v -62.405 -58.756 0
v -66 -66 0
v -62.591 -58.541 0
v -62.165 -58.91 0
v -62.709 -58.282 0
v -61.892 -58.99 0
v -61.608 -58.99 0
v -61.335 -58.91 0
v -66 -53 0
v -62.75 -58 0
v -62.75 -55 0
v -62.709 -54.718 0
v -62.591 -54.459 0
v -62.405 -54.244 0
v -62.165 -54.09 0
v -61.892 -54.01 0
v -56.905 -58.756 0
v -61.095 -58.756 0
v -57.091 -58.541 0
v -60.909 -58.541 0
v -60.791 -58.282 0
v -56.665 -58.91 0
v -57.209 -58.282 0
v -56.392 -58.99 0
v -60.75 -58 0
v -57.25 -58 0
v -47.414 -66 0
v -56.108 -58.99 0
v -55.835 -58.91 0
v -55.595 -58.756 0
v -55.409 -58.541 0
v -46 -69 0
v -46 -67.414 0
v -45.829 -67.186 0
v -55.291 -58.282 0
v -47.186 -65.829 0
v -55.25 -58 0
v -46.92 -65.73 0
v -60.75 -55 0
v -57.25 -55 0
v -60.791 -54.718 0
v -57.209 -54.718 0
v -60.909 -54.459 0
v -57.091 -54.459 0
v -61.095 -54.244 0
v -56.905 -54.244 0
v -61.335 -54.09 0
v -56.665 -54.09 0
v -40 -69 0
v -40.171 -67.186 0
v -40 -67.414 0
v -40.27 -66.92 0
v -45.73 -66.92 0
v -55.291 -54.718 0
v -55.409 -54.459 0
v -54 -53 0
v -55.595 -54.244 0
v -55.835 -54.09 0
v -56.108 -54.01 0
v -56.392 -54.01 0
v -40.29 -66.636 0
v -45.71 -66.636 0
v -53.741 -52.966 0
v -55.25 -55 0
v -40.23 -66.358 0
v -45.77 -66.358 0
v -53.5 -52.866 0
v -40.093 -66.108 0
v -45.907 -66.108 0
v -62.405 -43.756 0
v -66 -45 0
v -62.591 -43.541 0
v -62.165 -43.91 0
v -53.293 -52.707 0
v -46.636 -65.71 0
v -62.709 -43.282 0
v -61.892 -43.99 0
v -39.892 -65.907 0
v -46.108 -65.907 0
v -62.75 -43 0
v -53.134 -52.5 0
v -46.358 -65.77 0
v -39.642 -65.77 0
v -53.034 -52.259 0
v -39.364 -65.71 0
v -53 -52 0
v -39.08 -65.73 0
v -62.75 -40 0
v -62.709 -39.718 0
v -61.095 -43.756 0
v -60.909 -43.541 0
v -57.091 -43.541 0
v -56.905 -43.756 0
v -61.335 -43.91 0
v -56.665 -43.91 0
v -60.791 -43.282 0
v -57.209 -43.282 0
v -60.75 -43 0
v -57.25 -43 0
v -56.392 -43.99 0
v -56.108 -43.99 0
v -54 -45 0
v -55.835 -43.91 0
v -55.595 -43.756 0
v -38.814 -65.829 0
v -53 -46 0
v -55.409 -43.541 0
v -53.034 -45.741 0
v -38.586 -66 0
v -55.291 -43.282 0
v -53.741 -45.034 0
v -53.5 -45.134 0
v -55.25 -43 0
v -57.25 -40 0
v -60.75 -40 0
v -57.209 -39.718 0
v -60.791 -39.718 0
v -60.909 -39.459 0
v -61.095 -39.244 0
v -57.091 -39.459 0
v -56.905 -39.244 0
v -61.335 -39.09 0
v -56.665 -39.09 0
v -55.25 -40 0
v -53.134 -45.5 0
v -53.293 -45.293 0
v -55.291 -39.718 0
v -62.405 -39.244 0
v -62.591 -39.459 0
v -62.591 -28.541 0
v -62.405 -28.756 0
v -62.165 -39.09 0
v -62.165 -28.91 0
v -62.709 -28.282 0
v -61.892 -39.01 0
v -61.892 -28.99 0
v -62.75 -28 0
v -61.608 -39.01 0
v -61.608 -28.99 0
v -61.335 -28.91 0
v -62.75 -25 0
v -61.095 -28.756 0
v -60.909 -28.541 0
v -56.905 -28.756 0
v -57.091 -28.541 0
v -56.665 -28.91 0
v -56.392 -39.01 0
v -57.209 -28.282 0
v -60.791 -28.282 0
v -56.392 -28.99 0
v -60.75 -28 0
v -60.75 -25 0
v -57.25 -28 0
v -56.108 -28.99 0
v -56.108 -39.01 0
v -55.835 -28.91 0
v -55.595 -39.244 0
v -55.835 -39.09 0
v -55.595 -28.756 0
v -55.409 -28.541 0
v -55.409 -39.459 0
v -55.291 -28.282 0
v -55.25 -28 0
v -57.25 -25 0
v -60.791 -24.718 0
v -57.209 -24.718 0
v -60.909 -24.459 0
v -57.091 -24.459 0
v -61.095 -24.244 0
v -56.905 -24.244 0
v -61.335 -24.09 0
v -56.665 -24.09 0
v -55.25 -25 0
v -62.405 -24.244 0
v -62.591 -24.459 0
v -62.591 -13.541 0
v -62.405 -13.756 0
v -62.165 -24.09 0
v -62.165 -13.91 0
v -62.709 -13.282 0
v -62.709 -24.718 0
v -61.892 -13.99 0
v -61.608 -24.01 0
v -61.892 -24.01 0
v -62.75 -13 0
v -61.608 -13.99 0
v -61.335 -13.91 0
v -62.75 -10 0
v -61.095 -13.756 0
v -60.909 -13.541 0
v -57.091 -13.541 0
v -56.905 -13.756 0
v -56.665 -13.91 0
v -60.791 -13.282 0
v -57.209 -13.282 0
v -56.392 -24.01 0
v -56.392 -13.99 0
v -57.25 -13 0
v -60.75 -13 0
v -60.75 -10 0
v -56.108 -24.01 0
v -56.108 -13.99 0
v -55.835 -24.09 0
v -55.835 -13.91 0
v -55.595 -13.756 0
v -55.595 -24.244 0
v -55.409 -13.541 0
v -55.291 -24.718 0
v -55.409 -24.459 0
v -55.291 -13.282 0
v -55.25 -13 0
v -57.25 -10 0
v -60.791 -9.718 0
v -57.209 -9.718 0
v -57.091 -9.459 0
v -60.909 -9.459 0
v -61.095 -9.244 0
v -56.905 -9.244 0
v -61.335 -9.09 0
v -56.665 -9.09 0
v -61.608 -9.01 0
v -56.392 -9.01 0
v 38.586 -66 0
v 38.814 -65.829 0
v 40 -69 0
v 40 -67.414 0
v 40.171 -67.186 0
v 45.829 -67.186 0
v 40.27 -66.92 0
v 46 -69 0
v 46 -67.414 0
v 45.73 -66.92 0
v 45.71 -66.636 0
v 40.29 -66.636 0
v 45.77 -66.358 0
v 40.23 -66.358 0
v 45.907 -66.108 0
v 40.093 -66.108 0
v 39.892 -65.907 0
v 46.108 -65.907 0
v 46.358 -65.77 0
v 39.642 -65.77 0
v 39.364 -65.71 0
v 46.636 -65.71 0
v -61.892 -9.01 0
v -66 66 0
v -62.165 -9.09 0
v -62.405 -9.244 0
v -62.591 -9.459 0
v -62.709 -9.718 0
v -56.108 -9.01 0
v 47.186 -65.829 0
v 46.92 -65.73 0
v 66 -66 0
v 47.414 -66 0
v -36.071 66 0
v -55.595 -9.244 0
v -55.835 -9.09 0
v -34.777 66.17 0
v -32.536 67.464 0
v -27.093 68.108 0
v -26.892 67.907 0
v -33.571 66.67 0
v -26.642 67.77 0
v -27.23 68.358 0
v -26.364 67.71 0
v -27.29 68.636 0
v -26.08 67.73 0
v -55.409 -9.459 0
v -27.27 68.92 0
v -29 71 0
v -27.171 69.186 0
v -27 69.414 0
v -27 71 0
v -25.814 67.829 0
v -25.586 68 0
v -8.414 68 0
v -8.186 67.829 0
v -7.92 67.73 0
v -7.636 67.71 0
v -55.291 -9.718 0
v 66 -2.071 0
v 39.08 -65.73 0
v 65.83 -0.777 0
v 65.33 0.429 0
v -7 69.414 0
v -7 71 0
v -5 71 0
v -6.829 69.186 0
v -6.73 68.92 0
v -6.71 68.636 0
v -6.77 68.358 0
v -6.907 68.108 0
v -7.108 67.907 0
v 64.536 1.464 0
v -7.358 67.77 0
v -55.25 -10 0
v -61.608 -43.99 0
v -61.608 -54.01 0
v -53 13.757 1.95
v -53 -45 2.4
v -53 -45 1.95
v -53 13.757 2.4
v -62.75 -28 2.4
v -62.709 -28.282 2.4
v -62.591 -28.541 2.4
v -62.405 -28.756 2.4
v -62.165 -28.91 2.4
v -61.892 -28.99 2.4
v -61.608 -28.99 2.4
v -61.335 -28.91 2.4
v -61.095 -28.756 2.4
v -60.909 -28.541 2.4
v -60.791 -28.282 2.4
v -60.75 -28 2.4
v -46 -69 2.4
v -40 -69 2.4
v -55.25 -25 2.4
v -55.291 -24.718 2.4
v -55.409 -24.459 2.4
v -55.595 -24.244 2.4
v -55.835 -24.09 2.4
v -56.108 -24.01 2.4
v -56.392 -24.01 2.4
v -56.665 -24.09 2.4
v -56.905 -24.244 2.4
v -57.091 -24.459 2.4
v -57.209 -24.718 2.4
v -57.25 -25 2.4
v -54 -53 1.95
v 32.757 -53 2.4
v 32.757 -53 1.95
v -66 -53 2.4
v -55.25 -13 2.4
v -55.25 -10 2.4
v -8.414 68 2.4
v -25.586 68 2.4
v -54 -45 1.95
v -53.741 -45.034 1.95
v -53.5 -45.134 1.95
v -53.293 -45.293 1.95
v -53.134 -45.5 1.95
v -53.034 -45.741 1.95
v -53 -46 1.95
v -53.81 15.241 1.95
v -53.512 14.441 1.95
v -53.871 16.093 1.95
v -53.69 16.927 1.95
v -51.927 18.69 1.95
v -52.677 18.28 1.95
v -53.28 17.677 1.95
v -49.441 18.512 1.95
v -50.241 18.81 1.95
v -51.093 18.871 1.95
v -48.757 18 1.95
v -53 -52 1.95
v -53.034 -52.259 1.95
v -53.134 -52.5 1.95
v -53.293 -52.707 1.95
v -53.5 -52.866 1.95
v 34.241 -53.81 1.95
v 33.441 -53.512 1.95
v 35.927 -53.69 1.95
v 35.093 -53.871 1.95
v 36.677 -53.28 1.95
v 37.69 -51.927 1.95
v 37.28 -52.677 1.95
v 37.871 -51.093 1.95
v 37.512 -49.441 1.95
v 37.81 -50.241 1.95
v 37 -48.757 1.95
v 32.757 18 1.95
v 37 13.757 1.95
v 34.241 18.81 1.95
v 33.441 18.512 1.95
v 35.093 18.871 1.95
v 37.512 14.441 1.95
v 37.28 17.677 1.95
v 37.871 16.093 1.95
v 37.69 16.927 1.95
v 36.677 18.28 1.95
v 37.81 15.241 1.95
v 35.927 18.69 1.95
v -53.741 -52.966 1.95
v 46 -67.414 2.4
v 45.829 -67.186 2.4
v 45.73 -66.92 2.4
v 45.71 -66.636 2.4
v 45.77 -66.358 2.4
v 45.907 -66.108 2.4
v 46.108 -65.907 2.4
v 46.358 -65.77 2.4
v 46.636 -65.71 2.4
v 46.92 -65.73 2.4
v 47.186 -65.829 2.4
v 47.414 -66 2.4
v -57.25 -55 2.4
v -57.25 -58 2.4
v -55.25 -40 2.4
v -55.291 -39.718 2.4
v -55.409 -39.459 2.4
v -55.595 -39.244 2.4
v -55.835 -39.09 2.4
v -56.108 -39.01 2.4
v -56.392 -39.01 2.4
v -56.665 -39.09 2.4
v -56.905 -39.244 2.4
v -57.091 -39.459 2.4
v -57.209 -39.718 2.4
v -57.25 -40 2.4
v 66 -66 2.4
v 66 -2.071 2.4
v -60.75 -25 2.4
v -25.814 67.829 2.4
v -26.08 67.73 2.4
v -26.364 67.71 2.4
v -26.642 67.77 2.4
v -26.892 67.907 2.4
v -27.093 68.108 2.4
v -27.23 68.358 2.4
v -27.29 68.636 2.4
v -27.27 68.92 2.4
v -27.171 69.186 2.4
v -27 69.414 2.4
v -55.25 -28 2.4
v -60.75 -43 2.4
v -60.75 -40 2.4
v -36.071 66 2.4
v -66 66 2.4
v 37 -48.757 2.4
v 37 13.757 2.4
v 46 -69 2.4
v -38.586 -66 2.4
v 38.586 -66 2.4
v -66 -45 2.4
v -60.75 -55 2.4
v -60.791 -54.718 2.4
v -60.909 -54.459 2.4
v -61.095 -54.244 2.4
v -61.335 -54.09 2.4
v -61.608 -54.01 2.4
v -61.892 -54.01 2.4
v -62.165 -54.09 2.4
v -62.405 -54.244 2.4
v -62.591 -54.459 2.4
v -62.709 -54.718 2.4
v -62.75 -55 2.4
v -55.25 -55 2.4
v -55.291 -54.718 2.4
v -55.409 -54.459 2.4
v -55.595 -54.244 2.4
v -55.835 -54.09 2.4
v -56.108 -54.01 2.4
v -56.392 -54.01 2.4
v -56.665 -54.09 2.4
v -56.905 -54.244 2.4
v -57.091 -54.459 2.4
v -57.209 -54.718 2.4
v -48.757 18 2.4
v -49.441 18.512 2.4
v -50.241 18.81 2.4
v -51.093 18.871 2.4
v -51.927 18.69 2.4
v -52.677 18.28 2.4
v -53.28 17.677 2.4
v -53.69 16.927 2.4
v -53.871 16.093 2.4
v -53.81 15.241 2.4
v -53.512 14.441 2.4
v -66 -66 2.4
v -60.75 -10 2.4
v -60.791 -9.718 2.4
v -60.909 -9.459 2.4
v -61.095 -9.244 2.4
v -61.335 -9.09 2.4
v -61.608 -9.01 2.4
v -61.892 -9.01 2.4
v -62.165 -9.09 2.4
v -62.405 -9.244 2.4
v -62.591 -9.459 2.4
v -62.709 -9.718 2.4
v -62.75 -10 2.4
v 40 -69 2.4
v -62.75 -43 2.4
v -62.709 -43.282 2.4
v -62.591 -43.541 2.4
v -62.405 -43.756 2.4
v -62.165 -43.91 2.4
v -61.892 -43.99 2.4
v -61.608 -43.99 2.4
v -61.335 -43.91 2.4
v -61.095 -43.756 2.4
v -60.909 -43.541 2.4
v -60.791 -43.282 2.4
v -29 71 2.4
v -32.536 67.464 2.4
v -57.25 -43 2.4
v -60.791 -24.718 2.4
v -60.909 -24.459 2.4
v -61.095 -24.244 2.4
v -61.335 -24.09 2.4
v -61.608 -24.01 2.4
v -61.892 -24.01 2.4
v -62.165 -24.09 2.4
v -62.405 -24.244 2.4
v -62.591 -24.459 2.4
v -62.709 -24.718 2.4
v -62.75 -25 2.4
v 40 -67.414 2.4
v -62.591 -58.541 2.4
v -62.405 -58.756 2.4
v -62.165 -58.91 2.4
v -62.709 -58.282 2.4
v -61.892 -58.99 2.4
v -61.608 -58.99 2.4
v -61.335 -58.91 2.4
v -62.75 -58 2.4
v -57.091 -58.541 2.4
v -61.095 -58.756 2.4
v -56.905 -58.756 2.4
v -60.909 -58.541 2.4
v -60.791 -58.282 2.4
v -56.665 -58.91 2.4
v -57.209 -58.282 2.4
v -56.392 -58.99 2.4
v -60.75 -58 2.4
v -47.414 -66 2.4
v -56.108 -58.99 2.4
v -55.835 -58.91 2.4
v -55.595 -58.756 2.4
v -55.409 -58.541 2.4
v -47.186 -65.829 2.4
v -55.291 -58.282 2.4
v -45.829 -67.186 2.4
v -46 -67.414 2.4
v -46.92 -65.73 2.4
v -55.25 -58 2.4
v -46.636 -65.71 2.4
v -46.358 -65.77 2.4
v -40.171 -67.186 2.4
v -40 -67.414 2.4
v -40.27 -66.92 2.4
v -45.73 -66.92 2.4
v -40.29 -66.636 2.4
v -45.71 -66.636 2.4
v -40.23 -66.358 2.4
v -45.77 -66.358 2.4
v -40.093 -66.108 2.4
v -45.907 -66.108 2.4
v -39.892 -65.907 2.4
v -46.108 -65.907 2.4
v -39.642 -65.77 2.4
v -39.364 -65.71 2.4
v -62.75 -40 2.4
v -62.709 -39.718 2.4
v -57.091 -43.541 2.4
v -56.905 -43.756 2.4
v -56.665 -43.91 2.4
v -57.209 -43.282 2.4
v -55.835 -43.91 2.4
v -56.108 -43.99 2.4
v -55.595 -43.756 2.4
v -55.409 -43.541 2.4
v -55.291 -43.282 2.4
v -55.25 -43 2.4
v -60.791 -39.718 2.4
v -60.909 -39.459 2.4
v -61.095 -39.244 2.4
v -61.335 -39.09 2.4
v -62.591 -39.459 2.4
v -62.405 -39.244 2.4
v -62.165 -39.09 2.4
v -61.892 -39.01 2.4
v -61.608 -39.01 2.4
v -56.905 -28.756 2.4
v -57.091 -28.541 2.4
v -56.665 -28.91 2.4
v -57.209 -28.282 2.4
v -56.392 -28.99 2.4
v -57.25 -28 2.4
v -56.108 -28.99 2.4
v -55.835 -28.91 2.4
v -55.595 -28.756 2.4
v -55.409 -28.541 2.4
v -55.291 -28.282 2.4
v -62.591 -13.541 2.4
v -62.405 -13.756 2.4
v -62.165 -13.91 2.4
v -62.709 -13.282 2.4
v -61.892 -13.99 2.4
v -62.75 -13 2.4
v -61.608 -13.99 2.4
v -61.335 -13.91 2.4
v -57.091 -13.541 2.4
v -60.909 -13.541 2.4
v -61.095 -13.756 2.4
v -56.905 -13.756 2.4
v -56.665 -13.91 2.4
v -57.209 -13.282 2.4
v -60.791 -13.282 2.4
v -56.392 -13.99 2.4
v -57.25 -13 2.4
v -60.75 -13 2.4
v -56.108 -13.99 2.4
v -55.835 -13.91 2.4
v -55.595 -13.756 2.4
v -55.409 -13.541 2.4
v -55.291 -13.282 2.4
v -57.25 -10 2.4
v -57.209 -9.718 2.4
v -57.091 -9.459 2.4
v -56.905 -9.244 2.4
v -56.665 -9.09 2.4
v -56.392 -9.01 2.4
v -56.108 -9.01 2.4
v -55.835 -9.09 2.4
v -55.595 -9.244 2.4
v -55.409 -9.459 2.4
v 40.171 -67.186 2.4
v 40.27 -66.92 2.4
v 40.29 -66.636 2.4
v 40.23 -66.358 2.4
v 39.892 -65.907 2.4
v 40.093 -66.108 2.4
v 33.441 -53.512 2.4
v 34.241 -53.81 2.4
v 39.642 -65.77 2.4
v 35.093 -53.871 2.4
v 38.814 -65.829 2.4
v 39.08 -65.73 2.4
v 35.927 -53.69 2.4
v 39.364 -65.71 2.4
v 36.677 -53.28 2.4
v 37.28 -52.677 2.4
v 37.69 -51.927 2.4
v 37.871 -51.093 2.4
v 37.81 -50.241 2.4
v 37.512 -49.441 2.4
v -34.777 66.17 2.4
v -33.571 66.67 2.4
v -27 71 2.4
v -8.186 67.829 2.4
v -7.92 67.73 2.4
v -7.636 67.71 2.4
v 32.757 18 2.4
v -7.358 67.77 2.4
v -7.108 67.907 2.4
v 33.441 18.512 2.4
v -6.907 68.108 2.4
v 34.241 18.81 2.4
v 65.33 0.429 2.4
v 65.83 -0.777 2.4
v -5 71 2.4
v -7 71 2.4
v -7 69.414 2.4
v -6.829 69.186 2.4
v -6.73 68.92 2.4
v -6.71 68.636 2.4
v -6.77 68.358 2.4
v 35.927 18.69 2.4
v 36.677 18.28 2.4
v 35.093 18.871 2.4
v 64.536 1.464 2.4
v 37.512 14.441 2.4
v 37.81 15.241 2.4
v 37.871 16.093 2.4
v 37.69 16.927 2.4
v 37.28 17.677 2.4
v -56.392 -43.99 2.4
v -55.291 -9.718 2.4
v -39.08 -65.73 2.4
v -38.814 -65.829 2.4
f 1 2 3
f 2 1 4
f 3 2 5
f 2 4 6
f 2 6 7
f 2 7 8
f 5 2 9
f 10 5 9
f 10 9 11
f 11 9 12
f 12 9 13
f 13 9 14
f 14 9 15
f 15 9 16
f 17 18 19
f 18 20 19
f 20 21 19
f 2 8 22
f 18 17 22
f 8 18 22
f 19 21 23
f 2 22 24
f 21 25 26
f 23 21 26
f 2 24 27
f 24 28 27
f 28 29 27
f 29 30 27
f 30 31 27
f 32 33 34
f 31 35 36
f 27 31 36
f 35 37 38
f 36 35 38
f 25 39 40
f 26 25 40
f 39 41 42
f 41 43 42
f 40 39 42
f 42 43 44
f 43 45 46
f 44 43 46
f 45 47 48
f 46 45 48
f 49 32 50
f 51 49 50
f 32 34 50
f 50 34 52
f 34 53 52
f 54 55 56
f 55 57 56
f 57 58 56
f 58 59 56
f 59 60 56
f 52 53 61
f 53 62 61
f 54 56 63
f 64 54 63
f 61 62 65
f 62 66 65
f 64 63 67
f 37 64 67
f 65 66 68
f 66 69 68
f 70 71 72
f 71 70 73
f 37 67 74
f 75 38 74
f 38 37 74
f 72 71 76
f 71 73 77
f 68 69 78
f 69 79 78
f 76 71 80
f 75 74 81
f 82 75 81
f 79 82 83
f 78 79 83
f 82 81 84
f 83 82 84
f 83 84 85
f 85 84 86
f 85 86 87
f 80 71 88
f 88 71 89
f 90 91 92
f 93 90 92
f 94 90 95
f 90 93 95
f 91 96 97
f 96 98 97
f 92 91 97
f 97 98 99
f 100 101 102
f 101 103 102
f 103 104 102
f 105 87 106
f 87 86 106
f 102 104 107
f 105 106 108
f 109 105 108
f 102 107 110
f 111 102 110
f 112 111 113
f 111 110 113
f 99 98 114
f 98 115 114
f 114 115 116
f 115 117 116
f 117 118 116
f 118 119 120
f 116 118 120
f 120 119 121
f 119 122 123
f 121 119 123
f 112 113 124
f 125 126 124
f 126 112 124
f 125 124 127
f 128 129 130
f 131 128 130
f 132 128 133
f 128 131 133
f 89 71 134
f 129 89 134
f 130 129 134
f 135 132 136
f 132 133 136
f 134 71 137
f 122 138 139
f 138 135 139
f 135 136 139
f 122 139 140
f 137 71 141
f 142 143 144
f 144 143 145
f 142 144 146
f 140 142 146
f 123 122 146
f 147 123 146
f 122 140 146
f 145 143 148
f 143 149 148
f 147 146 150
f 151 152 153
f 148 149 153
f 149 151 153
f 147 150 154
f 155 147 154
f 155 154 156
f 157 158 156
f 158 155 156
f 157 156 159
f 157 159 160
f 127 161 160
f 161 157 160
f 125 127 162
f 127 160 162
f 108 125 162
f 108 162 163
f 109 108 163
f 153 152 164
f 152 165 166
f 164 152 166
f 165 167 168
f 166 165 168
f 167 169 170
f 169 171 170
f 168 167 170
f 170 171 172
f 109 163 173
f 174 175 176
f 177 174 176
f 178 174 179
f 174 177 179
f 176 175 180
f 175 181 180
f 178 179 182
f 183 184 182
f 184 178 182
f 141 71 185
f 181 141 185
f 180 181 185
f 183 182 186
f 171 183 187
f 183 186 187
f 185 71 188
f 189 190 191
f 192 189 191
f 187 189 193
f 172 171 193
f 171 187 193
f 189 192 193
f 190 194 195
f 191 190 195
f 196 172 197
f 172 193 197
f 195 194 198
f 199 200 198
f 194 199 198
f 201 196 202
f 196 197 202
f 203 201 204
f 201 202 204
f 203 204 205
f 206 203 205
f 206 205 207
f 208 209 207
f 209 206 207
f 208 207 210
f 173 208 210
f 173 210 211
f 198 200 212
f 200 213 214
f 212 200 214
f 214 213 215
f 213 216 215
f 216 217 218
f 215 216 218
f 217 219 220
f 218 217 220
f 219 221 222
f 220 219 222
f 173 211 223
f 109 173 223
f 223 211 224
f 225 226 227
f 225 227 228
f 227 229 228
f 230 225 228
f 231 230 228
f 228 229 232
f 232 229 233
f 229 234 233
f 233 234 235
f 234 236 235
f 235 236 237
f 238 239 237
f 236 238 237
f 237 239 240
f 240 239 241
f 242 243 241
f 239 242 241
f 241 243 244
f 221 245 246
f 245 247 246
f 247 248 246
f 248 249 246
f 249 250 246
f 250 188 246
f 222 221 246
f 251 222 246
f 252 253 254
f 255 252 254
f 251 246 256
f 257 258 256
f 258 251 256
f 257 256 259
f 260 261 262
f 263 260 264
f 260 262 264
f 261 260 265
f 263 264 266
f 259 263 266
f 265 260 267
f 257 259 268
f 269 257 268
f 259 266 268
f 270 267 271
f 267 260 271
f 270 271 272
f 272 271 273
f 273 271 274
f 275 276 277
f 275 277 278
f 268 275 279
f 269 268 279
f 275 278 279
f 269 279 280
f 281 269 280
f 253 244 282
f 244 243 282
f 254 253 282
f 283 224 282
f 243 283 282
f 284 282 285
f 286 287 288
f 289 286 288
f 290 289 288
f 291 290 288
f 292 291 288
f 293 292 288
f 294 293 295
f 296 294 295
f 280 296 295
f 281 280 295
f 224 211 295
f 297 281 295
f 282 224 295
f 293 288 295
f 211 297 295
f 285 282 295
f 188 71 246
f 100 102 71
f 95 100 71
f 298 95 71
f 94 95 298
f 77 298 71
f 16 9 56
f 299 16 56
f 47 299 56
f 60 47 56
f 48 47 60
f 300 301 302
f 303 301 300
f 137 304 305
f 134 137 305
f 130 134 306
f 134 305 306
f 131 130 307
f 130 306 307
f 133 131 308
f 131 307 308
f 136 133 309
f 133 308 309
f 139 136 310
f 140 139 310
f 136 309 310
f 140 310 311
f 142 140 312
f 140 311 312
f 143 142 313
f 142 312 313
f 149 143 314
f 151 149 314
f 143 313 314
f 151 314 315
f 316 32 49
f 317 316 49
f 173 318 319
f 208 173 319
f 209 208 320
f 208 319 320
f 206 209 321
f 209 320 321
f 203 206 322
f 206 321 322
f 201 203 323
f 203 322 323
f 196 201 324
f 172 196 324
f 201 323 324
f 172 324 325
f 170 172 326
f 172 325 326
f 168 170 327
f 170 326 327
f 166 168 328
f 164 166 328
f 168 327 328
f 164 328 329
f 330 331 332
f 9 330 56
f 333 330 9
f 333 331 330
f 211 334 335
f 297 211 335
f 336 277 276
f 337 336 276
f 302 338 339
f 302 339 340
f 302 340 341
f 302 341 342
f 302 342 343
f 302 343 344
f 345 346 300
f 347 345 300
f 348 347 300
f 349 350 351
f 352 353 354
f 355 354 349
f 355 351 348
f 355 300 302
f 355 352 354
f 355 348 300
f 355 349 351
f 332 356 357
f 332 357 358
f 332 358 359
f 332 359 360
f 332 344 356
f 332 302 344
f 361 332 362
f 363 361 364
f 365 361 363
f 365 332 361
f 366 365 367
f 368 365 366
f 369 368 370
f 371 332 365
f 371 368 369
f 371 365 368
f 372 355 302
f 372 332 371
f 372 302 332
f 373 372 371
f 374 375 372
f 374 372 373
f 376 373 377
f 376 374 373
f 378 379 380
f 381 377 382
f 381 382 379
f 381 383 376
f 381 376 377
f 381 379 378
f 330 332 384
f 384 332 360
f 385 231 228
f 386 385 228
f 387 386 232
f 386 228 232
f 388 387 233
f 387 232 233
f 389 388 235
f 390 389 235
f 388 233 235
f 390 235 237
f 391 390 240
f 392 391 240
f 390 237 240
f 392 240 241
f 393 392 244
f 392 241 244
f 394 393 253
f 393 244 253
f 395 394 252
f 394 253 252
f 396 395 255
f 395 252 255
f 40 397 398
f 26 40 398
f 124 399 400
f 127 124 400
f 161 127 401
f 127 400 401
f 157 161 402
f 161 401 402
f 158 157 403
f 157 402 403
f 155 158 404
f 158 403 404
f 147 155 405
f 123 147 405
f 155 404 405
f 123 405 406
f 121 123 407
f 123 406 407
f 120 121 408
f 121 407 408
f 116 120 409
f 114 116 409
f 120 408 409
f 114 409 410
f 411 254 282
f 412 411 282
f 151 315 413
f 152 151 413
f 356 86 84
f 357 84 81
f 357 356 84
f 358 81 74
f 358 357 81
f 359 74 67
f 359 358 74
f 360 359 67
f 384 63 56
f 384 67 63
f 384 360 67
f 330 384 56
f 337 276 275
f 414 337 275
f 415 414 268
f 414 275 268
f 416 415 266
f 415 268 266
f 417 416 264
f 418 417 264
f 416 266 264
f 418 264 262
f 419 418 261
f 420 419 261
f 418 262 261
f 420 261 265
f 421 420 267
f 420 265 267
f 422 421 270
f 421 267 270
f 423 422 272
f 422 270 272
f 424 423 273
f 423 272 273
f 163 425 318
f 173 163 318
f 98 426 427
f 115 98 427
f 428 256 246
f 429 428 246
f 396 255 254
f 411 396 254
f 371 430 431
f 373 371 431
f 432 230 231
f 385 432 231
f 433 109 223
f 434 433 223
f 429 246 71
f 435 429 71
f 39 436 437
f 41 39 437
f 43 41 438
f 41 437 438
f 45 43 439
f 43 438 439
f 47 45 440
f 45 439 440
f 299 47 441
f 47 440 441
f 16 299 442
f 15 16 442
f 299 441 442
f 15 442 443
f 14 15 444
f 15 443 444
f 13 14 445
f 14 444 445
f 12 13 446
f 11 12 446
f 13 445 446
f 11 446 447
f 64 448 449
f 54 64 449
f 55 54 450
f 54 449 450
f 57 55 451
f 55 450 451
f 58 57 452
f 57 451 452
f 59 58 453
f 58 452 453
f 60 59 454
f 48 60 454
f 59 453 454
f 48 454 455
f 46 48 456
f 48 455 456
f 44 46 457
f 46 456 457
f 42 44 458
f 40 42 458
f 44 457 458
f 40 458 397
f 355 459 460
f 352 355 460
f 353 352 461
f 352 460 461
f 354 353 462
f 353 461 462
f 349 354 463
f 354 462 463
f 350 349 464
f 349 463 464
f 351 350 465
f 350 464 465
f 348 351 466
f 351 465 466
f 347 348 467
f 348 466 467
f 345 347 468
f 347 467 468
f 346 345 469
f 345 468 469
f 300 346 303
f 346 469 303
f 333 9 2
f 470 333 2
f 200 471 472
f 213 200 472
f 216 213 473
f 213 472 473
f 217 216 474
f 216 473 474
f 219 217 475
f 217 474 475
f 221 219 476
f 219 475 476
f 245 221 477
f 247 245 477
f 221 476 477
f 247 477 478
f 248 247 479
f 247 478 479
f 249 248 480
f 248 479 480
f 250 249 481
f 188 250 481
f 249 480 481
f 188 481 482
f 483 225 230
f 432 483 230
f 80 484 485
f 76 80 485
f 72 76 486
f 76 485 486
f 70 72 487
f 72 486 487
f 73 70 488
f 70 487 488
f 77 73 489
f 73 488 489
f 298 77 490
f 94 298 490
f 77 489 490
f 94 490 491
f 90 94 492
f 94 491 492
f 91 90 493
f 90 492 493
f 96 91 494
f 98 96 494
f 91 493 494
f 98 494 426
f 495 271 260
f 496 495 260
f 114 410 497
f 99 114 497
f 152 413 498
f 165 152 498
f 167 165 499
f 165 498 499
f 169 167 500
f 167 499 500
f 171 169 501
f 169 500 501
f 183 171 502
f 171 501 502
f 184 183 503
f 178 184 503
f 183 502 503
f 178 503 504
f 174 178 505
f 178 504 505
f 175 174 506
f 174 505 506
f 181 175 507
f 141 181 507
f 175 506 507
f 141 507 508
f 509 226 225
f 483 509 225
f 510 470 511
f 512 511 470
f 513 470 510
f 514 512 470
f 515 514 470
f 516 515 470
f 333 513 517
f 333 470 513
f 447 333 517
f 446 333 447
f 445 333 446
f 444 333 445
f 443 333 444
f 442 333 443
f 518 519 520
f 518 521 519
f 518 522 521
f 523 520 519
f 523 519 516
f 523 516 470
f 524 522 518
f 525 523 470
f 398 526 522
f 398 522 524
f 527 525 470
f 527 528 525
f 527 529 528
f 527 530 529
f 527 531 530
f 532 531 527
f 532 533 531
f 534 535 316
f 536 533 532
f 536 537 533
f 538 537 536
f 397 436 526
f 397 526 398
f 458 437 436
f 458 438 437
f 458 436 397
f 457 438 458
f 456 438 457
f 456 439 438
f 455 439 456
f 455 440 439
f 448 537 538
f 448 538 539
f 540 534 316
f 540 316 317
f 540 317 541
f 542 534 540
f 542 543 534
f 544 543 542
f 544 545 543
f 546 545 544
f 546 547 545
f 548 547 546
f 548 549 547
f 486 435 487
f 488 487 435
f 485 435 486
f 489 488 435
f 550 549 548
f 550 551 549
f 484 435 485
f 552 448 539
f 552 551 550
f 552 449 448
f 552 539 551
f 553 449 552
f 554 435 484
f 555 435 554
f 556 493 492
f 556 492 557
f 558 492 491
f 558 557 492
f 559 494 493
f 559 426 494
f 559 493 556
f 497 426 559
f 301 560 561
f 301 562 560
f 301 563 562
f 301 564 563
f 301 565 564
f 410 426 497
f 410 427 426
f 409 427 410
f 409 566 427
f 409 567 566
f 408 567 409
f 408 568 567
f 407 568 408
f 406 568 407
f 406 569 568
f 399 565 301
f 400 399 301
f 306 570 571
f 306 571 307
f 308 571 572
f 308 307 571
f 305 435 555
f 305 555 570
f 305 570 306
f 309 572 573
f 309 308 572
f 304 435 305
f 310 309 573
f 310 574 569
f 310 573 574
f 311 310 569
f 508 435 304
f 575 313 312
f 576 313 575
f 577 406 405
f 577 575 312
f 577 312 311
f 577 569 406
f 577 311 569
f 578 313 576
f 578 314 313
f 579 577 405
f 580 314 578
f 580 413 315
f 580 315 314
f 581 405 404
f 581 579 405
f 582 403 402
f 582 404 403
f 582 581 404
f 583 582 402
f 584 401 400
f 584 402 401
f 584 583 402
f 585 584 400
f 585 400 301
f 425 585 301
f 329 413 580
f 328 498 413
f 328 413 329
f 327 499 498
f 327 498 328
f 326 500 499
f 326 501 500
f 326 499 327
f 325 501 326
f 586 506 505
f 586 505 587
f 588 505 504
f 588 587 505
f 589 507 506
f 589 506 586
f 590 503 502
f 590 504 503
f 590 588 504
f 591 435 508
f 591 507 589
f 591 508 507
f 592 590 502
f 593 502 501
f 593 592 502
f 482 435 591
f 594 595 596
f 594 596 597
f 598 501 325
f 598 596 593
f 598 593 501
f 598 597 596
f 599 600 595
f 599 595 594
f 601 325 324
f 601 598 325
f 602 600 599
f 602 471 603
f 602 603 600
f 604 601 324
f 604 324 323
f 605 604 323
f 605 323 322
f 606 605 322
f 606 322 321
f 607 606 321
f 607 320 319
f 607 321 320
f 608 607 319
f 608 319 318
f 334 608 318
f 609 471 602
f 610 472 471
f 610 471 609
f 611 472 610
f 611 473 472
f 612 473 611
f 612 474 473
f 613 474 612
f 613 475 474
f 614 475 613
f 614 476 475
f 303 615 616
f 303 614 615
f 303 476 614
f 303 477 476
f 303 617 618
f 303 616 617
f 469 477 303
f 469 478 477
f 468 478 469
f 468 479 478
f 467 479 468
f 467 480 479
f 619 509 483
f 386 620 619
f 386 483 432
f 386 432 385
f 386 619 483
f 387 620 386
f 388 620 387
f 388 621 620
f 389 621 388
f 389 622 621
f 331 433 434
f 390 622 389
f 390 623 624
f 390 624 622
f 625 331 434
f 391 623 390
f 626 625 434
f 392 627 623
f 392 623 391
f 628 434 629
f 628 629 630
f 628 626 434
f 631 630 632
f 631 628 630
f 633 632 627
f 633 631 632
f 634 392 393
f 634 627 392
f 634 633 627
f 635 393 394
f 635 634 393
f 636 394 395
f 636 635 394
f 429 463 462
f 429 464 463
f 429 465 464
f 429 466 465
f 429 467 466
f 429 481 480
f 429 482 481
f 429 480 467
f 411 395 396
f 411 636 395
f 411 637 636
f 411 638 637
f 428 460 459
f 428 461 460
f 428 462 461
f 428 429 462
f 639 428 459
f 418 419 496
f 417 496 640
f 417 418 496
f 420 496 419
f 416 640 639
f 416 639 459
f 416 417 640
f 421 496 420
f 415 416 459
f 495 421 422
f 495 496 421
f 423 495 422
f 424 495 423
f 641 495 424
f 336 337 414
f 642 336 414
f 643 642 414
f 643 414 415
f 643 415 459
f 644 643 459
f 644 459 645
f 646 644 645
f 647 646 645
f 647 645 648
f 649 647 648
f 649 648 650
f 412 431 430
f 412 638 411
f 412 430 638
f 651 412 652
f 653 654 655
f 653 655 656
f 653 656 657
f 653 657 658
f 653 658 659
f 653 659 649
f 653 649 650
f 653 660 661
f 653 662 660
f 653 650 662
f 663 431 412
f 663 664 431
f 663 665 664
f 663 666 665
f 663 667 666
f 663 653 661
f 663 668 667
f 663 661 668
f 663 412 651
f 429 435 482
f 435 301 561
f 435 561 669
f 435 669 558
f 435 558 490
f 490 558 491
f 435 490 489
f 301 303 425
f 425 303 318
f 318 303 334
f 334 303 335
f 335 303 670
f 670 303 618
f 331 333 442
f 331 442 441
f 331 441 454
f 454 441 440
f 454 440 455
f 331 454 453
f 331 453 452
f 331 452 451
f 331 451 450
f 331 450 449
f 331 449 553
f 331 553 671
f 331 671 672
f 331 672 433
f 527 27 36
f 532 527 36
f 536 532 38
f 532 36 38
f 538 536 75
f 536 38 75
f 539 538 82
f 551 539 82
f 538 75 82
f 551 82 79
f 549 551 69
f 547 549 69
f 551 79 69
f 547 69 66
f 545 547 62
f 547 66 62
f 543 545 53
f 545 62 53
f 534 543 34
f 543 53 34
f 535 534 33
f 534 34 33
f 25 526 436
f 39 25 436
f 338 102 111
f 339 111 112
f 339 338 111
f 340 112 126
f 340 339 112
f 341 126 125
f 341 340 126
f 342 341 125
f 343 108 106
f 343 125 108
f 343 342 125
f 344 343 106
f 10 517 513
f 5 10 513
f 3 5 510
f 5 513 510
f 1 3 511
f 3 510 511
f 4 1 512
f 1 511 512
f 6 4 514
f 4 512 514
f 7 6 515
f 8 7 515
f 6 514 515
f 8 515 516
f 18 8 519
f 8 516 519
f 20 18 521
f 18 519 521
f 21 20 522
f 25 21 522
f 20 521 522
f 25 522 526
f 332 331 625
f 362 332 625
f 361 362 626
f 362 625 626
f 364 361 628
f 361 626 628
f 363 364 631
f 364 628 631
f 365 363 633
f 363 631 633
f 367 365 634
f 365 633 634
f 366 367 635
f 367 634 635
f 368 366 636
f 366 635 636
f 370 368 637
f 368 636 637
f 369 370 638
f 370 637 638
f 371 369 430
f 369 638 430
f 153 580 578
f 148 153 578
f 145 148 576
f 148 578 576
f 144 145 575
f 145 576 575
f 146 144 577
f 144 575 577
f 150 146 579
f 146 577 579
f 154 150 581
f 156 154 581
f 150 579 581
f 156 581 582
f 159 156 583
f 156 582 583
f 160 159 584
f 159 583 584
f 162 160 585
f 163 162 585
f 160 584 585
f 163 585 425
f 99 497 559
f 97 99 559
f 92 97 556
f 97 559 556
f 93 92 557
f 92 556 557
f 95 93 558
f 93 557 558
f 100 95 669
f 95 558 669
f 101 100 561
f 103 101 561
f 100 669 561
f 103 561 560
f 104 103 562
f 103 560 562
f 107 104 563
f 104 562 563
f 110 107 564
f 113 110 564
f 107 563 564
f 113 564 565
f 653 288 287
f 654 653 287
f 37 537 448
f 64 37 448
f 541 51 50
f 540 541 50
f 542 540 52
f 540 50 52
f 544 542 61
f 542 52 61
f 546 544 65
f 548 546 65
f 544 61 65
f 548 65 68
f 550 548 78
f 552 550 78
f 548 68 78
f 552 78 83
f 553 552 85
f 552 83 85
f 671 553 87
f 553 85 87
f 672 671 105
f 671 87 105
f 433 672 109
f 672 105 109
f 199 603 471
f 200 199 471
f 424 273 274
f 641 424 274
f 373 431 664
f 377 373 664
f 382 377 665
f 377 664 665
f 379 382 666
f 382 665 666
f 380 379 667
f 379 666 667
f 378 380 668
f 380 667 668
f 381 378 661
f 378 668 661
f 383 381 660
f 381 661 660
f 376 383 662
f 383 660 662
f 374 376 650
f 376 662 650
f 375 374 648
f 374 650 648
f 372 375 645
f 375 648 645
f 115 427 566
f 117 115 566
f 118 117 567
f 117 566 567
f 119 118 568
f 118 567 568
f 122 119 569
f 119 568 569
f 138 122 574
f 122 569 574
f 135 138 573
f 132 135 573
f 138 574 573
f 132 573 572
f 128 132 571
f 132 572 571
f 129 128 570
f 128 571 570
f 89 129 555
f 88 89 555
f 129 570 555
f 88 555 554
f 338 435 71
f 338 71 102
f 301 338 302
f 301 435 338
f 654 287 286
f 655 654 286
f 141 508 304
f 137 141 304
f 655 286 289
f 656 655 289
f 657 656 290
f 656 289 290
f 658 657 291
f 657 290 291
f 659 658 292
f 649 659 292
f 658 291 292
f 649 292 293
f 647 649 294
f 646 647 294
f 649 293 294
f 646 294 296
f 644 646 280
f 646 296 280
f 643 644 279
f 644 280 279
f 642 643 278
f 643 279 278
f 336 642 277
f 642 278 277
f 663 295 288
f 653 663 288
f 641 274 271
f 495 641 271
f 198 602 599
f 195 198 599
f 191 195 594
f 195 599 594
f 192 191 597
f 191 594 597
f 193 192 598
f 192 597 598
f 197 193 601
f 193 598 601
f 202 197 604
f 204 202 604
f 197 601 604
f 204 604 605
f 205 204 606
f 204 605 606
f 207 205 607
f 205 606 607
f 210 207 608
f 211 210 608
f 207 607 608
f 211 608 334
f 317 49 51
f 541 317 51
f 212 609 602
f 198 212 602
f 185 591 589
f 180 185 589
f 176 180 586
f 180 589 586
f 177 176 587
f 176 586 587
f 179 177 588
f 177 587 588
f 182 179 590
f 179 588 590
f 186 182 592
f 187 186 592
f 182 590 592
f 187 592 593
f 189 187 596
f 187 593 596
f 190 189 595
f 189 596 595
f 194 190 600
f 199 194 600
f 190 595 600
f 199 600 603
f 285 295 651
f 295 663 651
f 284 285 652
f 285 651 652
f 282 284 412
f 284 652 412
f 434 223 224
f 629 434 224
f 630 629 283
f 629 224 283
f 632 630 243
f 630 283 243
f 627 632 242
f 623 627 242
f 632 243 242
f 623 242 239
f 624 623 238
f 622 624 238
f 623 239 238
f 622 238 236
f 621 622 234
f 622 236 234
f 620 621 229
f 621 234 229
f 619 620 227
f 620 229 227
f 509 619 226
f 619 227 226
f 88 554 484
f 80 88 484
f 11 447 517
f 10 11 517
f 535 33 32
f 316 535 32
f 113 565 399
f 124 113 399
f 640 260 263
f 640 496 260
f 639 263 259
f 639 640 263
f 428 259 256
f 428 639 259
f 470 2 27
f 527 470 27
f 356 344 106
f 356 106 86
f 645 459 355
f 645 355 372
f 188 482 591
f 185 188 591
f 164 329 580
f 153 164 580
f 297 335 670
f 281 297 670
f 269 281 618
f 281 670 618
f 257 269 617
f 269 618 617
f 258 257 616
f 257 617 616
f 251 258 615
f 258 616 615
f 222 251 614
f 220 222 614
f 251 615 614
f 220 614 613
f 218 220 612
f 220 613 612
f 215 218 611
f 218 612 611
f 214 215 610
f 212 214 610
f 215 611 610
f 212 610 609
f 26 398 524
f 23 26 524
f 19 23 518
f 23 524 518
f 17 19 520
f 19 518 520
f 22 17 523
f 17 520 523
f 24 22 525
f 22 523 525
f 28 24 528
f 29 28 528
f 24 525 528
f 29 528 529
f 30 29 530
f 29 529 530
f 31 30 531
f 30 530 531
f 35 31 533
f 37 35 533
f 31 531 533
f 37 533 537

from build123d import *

# Parameters (mm, degrees)
BOSS_EXTRUDE1_DEPTH = 2.4
CUT_EXTRUDE1_REACH  = 98.968
CUT_EXTRUDE2_DEPTH  = 0.45
CUT_EXTRUDE3_REACH  = 98.958
FILLET1_R           = 5


with BuildPart() as part:
    # Sketch1 → Boss-Extrude1 (new body)
    with BuildSketch(Plane.XY):
        with BuildLine():
            Line((66, 0), (-5, 71))
            Line((-5, 71), (-7, 71))
            Line((-7, 71), (-7, 69.414213562))
            ThreePointArc((-7, 69.414213562), (-7, 68), (-8.414213562, 68))
            Line((-8.414213562, 68), (-25.585786438, 68))
            ThreePointArc((-25.585786438, 68), (-27, 68), (-27, 69.414213562))
            Line((-27, 69.414213562), (-27, 71))
            Line((-27, 71), (-29, 71))
            Line((-29, 71), (-34, 66))
            Line((-34, 66), (-66, 66))
            Line((-66, 66), (-66, -66))
            Line((-66, -66), (-47.414213562, -66))
            ThreePointArc((-47.414213562, -66), (-46, -66), (-46, -67.414213562))
            Line((-46, -67.414213562), (-46, -69))
            Line((-46, -69), (-40, -69))
            Line((-40, -69), (-40, -67.414213562))
            ThreePointArc((-40, -67.414213562), (-40, -66), (-38.585786438, -66))
            Line((-38.585786438, -66), (38.585786438, -66))
            ThreePointArc((38.585786438, -66), (40, -66), (40, -67.414213562))
            Line((40, -67.414213562), (40, -69))
            Line((40, -69), (46, -69))
            Line((46, -69), (46, -67.414213562))
            ThreePointArc((46, -67.414213562), (46, -66), (47.414213562, -66))
            Line((47.414213562, -66), (66, -66))
            Line((66, -66), (66, 0))
        make_face()
    extrude(amount=BOSS_EXTRUDE1_DEPTH)

    # Sketch3 → Cut-Extrude1 (cut, up to next)
    with BuildSketch(Plane.XY.offset(2.4), mode=Mode.PRIVATE) as cut_extrude1_sk1:
        with BuildLine():
            Line((-60.75, -13), (-60.75, -10))
            ThreePointArc((-60.75, -10), (-61.75, -9), (-62.75, -10))
            Line((-62.75, -10), (-62.75, -13))
            ThreePointArc((-62.75, -13), (-61.75, -14), (-60.75, -13))
        make_face()
    cut_extrude1_tool1 = extrude(cut_extrude1_sk1.sketch, amount=-CUT_EXTRUDE1_REACH, mode=Mode.PRIVATE) & part.part
    # Sketch3 → Cut-Extrude1 (cut, up to next)
    with BuildSketch(Plane.XY.offset(2.4), mode=Mode.PRIVATE) as cut_extrude1_sk2:
        with BuildLine():
            ThreePointArc((-55.25, -10), (-56.25, -9), (-57.25, -10))
            Line((-57.25, -10), (-57.25, -13))
            ThreePointArc((-57.25, -13), (-56.25, -14), (-55.25, -13))
            Line((-55.25, -13), (-55.25, -10))
        make_face()
    cut_extrude1_tool2 = extrude(cut_extrude1_sk2.sketch, amount=-CUT_EXTRUDE1_REACH, mode=Mode.PRIVATE) & part.part
    # Sketch3 → Cut-Extrude1 (cut, up to next)
    with BuildSketch(Plane.XY.offset(2.4), mode=Mode.PRIVATE) as cut_extrude1_sk3:
        with BuildLine():
            Line((-60.75, -28), (-60.75, -25))
            ThreePointArc((-60.75, -25), (-61.75, -24), (-62.75, -25))
            Line((-62.75, -25), (-62.75, -28))
            ThreePointArc((-62.75, -28), (-61.75, -29), (-60.75, -28))
        make_face()
    cut_extrude1_tool3 = extrude(cut_extrude1_sk3.sketch, amount=-CUT_EXTRUDE1_REACH, mode=Mode.PRIVATE) & part.part
    # Sketch3 → Cut-Extrude1 (cut, up to next)
    with BuildSketch(Plane.XY.offset(2.4), mode=Mode.PRIVATE) as cut_extrude1_sk4:
        with BuildLine():
            ThreePointArc((-55.25, -25), (-56.25, -24), (-57.25, -25))
            Line((-57.25, -25), (-57.25, -28))
            ThreePointArc((-57.25, -28), (-56.25, -29), (-55.25, -28))
            Line((-55.25, -28), (-55.25, -25))
        make_face()
    cut_extrude1_tool4 = extrude(cut_extrude1_sk4.sketch, amount=-CUT_EXTRUDE1_REACH, mode=Mode.PRIVATE) & part.part
    # Sketch3 → Cut-Extrude1 (cut, up to next)
    with BuildSketch(Plane.XY.offset(2.4), mode=Mode.PRIVATE) as cut_extrude1_sk5:
        with BuildLine():
            Line((-60.75, -43), (-60.75, -40))
            ThreePointArc((-60.75, -40), (-61.75, -39), (-62.75, -40))
            Line((-62.75, -40), (-62.75, -43))
            ThreePointArc((-62.75, -43), (-61.75, -44), (-60.75, -43))
        make_face()
    cut_extrude1_tool5 = extrude(cut_extrude1_sk5.sketch, amount=-CUT_EXTRUDE1_REACH, mode=Mode.PRIVATE) & part.part
    # Sketch3 → Cut-Extrude1 (cut, up to next)
    with BuildSketch(Plane.XY.offset(2.4), mode=Mode.PRIVATE) as cut_extrude1_sk6:
        with BuildLine():
            ThreePointArc((-55.25, -40), (-56.25, -39), (-57.25, -40))
            Line((-57.25, -40), (-57.25, -43))
            ThreePointArc((-57.25, -43), (-56.25, -44), (-55.25, -43))
            Line((-55.25, -43), (-55.25, -40))
        make_face()
    cut_extrude1_tool6 = extrude(cut_extrude1_sk6.sketch, amount=-CUT_EXTRUDE1_REACH, mode=Mode.PRIVATE) & part.part
    # Sketch3 → Cut-Extrude1 (cut, up to next)
    with BuildSketch(Plane.XY.offset(2.4), mode=Mode.PRIVATE) as cut_extrude1_sk7:
        with BuildLine():
            Line((-60.75, -58), (-60.75, -55))
            ThreePointArc((-60.75, -55), (-61.75, -54), (-62.75, -55))
            Line((-62.75, -55), (-62.75, -58))
            ThreePointArc((-62.75, -58), (-61.75, -59), (-60.75, -58))
        make_face()
    cut_extrude1_tool7 = extrude(cut_extrude1_sk7.sketch, amount=-CUT_EXTRUDE1_REACH, mode=Mode.PRIVATE) & part.part
    # Sketch3 → Cut-Extrude1 (cut, up to next)
    with BuildSketch(Plane.XY.offset(2.4), mode=Mode.PRIVATE) as cut_extrude1_sk8:
        with BuildLine():
            ThreePointArc((-55.25, -55), (-56.25, -54), (-57.25, -55))
            Line((-57.25, -55), (-57.25, -58))
            ThreePointArc((-57.25, -58), (-56.25, -59), (-55.25, -58))
            Line((-55.25, -58), (-55.25, -55))
        make_face()
    cut_extrude1_tool8 = extrude(cut_extrude1_sk8.sketch, amount=-CUT_EXTRUDE1_REACH, mode=Mode.PRIVATE) & part.part
    add(cut_extrude1_tool1.solids().sort_by_distance((-61.75, -11.5, 2.4))[0], mode=Mode.SUBTRACT)
    add(cut_extrude1_tool2.solids().sort_by_distance((-56.25, -11.5, 2.4))[0], mode=Mode.SUBTRACT)
    add(cut_extrude1_tool3.solids().sort_by_distance((-61.75, -26.5, 2.4))[0], mode=Mode.SUBTRACT)
    add(cut_extrude1_tool4.solids().sort_by_distance((-56.25, -26.5, 2.4))[0], mode=Mode.SUBTRACT)
    add(cut_extrude1_tool5.solids().sort_by_distance((-61.75, -41.5, 2.4))[0], mode=Mode.SUBTRACT)
    add(cut_extrude1_tool6.solids().sort_by_distance((-56.25, -41.5, 2.4))[0], mode=Mode.SUBTRACT)
    add(cut_extrude1_tool7.solids().sort_by_distance((-61.75, -56.5, 2.4))[0], mode=Mode.SUBTRACT)
    add(cut_extrude1_tool8.solids().sort_by_distance((-56.25, -56.5, 2.4))[0], mode=Mode.SUBTRACT)

    # Sketch4 → Cut-Extrude2 (cut)
    with BuildSketch(Plane.XY.offset(2.4)):
        with BuildLine():
            Line((-53, 13.757359313), (-53, -45))
            Line((-53, -45), (-66, -45))
            Line((-66, -45), (-66, -53))
            Line((-66, -53), (32.757359313, -53))
            ThreePointArc((32.757359313, -53), (37, -53), (37, -48.757359313))
            Line((37, -48.757359313), (37, 13.757359313))
            ThreePointArc((37, 13.757359313), (37, 18), (32.757359313, 18))
            Line((32.757359313, 18), (-48.757359313, 18))
            ThreePointArc((-48.757359313, 18), (-53, 18), (-53, 13.757359313))
        make_face()
    extrude(amount=-CUT_EXTRUDE2_DEPTH, mode=Mode.SUBTRACT)

    # Sketch5 → Cut-Extrude3 (cut, up to next)
    with BuildSketch(Plane.XY.offset(1.95), mode=Mode.PRIVATE) as cut_extrude3_sk1:
        with BuildLine():
            Line((-66, -45), (-54, -45))
            ThreePointArc((-54, -45), (-53.292893219, -45.292893219), (-53, -46))
            Line((-53, -46), (-53, -52))
            ThreePointArc((-53, -52), (-53.292893219, -52.707106781), (-54, -53))
            Line((-54, -53), (-66, -53))
            Line((-66, -53), (-66, -45))
        make_face()
    cut_extrude3_tool1 = extrude(cut_extrude3_sk1.sketch, amount=-CUT_EXTRUDE3_REACH, mode=Mode.PRIVATE) & part.part
    add(cut_extrude3_tool1.solids().sort_by_distance((-59.526011, -49, 1.95))[0], mode=Mode.SUBTRACT)

    # Fillet1
    fillet1_edges = [part.edges().sort_by_distance(p)[0] for p in [
        (66, 0, 1.2),
        (-34, 66, 1.2),
    ]]
    fillet(fillet1_edges, radius=FILLET1_R)


solid = part.part
